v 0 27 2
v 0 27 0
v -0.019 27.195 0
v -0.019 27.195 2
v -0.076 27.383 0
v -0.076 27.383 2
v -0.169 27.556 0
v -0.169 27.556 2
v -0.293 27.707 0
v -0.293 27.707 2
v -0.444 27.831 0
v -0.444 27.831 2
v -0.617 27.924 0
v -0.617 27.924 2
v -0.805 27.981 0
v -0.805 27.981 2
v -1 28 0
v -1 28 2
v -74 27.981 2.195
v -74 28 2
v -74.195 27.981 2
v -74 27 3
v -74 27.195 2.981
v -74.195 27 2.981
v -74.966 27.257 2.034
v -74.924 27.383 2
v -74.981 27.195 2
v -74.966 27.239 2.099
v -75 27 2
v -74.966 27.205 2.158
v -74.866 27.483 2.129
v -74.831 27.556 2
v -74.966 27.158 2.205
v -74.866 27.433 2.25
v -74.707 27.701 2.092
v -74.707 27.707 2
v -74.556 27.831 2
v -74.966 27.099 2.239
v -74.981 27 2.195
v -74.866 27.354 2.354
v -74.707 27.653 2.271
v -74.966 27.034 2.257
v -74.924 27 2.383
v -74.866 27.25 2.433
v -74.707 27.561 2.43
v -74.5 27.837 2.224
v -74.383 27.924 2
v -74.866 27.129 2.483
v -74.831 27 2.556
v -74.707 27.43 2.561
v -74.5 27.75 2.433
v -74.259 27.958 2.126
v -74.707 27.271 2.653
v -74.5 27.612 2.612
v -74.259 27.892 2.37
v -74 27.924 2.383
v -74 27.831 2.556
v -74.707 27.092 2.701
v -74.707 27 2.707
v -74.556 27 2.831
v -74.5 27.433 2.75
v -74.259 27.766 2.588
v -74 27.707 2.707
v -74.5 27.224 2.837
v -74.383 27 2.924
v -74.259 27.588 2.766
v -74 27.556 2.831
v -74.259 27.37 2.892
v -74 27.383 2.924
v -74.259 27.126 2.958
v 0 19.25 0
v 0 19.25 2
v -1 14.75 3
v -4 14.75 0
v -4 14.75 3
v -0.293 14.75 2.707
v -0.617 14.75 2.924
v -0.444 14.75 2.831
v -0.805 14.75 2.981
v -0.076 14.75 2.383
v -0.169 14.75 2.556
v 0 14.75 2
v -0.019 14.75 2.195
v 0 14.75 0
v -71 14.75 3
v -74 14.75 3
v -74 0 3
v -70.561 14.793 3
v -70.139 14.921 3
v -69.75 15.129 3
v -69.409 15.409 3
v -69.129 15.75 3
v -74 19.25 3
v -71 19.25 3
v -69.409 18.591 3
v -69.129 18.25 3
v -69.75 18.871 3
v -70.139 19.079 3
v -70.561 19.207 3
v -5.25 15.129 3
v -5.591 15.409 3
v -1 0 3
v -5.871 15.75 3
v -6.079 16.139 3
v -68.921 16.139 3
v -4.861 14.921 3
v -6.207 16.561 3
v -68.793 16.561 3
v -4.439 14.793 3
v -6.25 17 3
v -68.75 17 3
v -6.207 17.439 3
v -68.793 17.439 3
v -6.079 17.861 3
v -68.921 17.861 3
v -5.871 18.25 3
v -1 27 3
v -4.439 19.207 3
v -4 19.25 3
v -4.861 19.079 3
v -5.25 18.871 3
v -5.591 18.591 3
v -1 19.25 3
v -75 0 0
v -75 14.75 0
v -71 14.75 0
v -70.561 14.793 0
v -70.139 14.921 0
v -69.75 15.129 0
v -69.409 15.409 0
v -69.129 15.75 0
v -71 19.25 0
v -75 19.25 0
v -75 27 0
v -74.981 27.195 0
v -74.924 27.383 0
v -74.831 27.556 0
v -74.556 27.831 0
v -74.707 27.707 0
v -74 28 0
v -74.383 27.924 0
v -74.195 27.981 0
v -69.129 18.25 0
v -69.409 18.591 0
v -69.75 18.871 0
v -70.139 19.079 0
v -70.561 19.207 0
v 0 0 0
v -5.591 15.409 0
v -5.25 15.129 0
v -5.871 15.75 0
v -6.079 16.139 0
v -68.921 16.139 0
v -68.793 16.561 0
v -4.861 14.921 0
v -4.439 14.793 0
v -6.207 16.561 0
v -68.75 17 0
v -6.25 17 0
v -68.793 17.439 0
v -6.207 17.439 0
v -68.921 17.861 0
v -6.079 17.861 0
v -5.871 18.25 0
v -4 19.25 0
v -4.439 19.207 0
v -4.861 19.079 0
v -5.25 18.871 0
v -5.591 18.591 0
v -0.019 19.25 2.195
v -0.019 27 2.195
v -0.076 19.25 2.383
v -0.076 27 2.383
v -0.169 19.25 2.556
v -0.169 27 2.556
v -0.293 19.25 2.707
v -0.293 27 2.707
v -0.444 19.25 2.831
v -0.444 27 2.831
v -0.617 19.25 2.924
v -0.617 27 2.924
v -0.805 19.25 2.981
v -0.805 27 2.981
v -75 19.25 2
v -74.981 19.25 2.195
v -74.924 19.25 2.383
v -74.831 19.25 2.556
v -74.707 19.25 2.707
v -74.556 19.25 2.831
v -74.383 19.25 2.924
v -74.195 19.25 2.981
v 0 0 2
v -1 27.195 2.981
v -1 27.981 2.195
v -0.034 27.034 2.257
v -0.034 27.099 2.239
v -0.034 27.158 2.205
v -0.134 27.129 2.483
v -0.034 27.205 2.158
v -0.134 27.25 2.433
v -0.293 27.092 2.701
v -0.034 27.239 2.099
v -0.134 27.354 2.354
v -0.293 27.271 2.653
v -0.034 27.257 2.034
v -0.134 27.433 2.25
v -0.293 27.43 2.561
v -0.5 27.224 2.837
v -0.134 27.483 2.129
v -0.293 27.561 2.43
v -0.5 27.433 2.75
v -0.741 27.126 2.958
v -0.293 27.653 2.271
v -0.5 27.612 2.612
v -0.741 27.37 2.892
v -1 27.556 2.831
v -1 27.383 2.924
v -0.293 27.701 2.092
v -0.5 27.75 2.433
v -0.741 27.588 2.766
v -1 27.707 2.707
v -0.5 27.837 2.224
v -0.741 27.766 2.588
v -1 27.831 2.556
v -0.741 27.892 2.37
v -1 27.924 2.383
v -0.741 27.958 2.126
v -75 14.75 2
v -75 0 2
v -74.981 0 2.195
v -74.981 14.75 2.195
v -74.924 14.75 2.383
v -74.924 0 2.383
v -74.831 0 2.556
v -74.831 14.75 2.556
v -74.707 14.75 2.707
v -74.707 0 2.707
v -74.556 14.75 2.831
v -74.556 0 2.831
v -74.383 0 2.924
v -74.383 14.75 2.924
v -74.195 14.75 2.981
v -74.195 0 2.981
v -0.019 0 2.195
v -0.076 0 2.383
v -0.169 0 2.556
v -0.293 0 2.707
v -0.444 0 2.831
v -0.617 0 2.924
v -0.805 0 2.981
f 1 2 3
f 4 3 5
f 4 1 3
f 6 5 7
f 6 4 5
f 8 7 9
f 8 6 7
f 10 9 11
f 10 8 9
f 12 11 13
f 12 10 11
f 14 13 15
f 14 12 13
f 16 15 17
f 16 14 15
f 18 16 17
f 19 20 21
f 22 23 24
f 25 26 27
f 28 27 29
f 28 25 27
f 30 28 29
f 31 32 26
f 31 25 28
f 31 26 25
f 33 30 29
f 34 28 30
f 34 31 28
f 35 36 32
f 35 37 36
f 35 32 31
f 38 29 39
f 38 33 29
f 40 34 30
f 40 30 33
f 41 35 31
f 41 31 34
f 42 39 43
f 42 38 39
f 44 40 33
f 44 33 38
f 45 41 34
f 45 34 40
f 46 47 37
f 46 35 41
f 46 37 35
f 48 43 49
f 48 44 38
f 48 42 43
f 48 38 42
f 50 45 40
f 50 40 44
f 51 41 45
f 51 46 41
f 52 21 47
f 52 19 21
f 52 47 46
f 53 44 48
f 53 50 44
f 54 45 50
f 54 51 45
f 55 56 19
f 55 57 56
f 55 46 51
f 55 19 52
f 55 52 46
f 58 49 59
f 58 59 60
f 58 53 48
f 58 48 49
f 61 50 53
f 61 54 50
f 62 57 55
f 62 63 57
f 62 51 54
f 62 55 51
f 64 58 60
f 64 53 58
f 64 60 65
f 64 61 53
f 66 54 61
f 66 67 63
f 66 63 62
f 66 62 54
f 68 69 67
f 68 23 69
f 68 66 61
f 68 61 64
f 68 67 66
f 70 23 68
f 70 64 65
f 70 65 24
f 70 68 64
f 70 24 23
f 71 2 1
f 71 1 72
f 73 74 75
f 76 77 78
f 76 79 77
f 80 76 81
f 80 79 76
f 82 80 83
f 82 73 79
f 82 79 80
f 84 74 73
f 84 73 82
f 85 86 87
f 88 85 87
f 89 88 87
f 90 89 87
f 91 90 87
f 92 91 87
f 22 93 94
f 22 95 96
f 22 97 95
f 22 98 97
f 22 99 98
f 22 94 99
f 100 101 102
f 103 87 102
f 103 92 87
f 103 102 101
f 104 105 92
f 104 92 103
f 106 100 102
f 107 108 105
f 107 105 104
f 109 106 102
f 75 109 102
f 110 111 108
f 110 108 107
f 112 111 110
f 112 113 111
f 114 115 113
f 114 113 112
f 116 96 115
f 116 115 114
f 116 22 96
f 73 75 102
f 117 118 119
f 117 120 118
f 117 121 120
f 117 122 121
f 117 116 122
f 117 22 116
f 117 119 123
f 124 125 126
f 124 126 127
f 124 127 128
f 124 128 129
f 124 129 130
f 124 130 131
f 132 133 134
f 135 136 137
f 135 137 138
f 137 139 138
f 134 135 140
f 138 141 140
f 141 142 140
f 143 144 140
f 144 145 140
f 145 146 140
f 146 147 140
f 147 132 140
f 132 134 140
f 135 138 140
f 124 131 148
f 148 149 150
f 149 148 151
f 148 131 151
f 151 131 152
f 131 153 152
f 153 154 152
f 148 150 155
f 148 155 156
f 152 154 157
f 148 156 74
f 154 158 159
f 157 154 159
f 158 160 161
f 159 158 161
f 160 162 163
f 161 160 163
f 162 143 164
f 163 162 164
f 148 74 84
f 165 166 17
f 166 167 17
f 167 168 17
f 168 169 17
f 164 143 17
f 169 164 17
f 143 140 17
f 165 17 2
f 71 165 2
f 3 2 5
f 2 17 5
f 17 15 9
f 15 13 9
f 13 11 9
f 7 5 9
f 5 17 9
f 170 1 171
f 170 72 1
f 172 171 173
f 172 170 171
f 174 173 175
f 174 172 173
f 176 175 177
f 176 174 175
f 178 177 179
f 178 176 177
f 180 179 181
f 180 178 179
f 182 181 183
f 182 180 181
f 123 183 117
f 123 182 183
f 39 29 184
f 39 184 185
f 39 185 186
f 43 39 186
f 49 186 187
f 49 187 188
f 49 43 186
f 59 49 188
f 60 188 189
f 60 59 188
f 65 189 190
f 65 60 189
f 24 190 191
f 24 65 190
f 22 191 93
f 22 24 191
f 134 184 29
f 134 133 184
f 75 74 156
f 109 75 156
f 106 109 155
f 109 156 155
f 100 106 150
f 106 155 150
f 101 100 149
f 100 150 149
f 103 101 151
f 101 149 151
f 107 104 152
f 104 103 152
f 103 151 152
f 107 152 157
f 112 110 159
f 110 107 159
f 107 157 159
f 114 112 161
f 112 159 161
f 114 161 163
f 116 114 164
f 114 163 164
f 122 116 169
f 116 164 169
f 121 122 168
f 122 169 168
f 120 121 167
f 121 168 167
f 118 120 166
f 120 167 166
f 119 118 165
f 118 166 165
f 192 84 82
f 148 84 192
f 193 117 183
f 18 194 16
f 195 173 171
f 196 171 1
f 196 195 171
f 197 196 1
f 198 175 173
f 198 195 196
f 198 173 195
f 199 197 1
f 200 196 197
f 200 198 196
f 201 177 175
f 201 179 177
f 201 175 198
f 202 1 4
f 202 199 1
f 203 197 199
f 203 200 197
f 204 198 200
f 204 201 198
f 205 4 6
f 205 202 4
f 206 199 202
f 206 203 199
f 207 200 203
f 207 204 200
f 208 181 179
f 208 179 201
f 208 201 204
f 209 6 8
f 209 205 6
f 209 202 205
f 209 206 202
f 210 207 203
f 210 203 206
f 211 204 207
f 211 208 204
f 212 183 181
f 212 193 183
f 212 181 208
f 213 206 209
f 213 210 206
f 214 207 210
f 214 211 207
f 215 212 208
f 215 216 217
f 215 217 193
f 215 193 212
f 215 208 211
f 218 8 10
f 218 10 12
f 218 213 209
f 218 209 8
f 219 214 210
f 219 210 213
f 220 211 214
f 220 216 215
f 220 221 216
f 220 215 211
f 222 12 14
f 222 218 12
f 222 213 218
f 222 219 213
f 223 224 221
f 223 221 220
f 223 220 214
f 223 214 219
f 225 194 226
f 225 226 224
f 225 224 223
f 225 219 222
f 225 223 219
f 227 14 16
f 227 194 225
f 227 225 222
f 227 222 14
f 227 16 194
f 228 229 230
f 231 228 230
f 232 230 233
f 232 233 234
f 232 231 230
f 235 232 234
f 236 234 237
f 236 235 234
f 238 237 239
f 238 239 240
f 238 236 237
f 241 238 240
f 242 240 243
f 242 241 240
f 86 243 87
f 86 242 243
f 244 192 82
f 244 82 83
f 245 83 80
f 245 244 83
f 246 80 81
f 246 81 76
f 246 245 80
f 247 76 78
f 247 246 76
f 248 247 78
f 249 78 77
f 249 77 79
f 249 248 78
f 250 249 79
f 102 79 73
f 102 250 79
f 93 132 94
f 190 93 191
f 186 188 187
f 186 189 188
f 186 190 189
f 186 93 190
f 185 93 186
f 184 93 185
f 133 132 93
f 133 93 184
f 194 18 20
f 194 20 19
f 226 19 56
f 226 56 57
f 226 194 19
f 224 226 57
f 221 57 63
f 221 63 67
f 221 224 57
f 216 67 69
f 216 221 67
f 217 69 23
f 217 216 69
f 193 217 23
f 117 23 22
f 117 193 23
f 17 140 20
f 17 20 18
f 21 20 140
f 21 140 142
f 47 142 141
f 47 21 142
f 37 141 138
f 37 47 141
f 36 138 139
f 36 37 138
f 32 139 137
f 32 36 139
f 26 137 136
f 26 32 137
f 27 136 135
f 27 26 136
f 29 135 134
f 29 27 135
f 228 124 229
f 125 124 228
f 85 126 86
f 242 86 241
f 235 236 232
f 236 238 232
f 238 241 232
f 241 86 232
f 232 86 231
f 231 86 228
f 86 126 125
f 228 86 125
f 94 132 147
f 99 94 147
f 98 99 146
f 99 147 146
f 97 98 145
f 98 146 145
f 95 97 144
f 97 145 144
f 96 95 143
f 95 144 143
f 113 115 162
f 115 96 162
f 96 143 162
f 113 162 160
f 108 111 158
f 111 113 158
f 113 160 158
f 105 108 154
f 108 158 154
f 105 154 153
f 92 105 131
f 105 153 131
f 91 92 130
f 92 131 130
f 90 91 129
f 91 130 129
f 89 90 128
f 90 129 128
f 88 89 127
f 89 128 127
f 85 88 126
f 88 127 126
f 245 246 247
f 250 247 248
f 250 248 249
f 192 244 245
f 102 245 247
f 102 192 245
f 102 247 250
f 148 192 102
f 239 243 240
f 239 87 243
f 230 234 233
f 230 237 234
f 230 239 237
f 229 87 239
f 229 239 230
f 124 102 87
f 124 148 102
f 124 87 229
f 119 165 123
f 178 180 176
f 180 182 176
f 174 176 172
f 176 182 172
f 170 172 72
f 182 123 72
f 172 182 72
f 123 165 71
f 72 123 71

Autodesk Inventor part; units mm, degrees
ref_plane "YZ Plane" through (0, 0, 0) normal (1, 0, 0) x (0, 1, 0)
ref_plane "XZ Plane" through (0, 0, 0) normal (0, 1, 0) x (-1, 0, 0)
ref_plane "XY Plane" through (0, 0, 0) normal (0, 0, 1) x (1, 0, 0)
sketch "Sketch1" plane through (0, 0, 0) normal (0, 0, 1) x (1, 0, 0)
  line L0 (0, 0) -> (-75, 0)
  line L1 (-75, 28) -> (0, 28)
  line L2 (0, 28) -> (0, 19.25) construction
  line L3 (0, 17) -> (-75, 17) construction
  line L4 (0, 17) -> (-4, 17) construction
  arc A0 (-4, 19.25) -> (-4, 14.75) centre (-4, 17) ccw
  line L5 (-4, 19.25) -> (0, 19.25)
  line L6 (-4, 14.75) -> (0, 14.75)
  line L7 (0, 28) -> (0, 19.25)
  line L8 (0, 14.75) -> (0, 0)
  line L9 (-37.5, 28) -> (-37.5, 0) construction
  arc A1 (-71, 14.75) -> (-71, 19.25) centre (-71, 17) ccw
  line L10 (-71, 19.25) -> (-75, 19.25)
  line L11 (-71, 14.75) -> (-75, 14.75)
  line L12 (-75, 0) -> (-75, 14.75)
  line L13 (-75, 19.25) -> (-75, 28)
  dimension "d0" = 75
  dimension "d1" = 28
  dimension "d2" = 11
  dimension "d3" = 4
  dimension "d4" = 4.5
extrude "Extrusion1" add sketch "Sketch1" along normal blind 3
fillet "Fillet1" radius 1 7 edges at (-37.5, 28, 3) (0, 28, 1.5) (-75, 28, 1.5) (0, 23.625, 3) (0, 7.375, 3) (-75, 23.625, 3) (-75, 7.375, 3)
properties part number "MirrorControllerModel" material "Iron, Cast"
